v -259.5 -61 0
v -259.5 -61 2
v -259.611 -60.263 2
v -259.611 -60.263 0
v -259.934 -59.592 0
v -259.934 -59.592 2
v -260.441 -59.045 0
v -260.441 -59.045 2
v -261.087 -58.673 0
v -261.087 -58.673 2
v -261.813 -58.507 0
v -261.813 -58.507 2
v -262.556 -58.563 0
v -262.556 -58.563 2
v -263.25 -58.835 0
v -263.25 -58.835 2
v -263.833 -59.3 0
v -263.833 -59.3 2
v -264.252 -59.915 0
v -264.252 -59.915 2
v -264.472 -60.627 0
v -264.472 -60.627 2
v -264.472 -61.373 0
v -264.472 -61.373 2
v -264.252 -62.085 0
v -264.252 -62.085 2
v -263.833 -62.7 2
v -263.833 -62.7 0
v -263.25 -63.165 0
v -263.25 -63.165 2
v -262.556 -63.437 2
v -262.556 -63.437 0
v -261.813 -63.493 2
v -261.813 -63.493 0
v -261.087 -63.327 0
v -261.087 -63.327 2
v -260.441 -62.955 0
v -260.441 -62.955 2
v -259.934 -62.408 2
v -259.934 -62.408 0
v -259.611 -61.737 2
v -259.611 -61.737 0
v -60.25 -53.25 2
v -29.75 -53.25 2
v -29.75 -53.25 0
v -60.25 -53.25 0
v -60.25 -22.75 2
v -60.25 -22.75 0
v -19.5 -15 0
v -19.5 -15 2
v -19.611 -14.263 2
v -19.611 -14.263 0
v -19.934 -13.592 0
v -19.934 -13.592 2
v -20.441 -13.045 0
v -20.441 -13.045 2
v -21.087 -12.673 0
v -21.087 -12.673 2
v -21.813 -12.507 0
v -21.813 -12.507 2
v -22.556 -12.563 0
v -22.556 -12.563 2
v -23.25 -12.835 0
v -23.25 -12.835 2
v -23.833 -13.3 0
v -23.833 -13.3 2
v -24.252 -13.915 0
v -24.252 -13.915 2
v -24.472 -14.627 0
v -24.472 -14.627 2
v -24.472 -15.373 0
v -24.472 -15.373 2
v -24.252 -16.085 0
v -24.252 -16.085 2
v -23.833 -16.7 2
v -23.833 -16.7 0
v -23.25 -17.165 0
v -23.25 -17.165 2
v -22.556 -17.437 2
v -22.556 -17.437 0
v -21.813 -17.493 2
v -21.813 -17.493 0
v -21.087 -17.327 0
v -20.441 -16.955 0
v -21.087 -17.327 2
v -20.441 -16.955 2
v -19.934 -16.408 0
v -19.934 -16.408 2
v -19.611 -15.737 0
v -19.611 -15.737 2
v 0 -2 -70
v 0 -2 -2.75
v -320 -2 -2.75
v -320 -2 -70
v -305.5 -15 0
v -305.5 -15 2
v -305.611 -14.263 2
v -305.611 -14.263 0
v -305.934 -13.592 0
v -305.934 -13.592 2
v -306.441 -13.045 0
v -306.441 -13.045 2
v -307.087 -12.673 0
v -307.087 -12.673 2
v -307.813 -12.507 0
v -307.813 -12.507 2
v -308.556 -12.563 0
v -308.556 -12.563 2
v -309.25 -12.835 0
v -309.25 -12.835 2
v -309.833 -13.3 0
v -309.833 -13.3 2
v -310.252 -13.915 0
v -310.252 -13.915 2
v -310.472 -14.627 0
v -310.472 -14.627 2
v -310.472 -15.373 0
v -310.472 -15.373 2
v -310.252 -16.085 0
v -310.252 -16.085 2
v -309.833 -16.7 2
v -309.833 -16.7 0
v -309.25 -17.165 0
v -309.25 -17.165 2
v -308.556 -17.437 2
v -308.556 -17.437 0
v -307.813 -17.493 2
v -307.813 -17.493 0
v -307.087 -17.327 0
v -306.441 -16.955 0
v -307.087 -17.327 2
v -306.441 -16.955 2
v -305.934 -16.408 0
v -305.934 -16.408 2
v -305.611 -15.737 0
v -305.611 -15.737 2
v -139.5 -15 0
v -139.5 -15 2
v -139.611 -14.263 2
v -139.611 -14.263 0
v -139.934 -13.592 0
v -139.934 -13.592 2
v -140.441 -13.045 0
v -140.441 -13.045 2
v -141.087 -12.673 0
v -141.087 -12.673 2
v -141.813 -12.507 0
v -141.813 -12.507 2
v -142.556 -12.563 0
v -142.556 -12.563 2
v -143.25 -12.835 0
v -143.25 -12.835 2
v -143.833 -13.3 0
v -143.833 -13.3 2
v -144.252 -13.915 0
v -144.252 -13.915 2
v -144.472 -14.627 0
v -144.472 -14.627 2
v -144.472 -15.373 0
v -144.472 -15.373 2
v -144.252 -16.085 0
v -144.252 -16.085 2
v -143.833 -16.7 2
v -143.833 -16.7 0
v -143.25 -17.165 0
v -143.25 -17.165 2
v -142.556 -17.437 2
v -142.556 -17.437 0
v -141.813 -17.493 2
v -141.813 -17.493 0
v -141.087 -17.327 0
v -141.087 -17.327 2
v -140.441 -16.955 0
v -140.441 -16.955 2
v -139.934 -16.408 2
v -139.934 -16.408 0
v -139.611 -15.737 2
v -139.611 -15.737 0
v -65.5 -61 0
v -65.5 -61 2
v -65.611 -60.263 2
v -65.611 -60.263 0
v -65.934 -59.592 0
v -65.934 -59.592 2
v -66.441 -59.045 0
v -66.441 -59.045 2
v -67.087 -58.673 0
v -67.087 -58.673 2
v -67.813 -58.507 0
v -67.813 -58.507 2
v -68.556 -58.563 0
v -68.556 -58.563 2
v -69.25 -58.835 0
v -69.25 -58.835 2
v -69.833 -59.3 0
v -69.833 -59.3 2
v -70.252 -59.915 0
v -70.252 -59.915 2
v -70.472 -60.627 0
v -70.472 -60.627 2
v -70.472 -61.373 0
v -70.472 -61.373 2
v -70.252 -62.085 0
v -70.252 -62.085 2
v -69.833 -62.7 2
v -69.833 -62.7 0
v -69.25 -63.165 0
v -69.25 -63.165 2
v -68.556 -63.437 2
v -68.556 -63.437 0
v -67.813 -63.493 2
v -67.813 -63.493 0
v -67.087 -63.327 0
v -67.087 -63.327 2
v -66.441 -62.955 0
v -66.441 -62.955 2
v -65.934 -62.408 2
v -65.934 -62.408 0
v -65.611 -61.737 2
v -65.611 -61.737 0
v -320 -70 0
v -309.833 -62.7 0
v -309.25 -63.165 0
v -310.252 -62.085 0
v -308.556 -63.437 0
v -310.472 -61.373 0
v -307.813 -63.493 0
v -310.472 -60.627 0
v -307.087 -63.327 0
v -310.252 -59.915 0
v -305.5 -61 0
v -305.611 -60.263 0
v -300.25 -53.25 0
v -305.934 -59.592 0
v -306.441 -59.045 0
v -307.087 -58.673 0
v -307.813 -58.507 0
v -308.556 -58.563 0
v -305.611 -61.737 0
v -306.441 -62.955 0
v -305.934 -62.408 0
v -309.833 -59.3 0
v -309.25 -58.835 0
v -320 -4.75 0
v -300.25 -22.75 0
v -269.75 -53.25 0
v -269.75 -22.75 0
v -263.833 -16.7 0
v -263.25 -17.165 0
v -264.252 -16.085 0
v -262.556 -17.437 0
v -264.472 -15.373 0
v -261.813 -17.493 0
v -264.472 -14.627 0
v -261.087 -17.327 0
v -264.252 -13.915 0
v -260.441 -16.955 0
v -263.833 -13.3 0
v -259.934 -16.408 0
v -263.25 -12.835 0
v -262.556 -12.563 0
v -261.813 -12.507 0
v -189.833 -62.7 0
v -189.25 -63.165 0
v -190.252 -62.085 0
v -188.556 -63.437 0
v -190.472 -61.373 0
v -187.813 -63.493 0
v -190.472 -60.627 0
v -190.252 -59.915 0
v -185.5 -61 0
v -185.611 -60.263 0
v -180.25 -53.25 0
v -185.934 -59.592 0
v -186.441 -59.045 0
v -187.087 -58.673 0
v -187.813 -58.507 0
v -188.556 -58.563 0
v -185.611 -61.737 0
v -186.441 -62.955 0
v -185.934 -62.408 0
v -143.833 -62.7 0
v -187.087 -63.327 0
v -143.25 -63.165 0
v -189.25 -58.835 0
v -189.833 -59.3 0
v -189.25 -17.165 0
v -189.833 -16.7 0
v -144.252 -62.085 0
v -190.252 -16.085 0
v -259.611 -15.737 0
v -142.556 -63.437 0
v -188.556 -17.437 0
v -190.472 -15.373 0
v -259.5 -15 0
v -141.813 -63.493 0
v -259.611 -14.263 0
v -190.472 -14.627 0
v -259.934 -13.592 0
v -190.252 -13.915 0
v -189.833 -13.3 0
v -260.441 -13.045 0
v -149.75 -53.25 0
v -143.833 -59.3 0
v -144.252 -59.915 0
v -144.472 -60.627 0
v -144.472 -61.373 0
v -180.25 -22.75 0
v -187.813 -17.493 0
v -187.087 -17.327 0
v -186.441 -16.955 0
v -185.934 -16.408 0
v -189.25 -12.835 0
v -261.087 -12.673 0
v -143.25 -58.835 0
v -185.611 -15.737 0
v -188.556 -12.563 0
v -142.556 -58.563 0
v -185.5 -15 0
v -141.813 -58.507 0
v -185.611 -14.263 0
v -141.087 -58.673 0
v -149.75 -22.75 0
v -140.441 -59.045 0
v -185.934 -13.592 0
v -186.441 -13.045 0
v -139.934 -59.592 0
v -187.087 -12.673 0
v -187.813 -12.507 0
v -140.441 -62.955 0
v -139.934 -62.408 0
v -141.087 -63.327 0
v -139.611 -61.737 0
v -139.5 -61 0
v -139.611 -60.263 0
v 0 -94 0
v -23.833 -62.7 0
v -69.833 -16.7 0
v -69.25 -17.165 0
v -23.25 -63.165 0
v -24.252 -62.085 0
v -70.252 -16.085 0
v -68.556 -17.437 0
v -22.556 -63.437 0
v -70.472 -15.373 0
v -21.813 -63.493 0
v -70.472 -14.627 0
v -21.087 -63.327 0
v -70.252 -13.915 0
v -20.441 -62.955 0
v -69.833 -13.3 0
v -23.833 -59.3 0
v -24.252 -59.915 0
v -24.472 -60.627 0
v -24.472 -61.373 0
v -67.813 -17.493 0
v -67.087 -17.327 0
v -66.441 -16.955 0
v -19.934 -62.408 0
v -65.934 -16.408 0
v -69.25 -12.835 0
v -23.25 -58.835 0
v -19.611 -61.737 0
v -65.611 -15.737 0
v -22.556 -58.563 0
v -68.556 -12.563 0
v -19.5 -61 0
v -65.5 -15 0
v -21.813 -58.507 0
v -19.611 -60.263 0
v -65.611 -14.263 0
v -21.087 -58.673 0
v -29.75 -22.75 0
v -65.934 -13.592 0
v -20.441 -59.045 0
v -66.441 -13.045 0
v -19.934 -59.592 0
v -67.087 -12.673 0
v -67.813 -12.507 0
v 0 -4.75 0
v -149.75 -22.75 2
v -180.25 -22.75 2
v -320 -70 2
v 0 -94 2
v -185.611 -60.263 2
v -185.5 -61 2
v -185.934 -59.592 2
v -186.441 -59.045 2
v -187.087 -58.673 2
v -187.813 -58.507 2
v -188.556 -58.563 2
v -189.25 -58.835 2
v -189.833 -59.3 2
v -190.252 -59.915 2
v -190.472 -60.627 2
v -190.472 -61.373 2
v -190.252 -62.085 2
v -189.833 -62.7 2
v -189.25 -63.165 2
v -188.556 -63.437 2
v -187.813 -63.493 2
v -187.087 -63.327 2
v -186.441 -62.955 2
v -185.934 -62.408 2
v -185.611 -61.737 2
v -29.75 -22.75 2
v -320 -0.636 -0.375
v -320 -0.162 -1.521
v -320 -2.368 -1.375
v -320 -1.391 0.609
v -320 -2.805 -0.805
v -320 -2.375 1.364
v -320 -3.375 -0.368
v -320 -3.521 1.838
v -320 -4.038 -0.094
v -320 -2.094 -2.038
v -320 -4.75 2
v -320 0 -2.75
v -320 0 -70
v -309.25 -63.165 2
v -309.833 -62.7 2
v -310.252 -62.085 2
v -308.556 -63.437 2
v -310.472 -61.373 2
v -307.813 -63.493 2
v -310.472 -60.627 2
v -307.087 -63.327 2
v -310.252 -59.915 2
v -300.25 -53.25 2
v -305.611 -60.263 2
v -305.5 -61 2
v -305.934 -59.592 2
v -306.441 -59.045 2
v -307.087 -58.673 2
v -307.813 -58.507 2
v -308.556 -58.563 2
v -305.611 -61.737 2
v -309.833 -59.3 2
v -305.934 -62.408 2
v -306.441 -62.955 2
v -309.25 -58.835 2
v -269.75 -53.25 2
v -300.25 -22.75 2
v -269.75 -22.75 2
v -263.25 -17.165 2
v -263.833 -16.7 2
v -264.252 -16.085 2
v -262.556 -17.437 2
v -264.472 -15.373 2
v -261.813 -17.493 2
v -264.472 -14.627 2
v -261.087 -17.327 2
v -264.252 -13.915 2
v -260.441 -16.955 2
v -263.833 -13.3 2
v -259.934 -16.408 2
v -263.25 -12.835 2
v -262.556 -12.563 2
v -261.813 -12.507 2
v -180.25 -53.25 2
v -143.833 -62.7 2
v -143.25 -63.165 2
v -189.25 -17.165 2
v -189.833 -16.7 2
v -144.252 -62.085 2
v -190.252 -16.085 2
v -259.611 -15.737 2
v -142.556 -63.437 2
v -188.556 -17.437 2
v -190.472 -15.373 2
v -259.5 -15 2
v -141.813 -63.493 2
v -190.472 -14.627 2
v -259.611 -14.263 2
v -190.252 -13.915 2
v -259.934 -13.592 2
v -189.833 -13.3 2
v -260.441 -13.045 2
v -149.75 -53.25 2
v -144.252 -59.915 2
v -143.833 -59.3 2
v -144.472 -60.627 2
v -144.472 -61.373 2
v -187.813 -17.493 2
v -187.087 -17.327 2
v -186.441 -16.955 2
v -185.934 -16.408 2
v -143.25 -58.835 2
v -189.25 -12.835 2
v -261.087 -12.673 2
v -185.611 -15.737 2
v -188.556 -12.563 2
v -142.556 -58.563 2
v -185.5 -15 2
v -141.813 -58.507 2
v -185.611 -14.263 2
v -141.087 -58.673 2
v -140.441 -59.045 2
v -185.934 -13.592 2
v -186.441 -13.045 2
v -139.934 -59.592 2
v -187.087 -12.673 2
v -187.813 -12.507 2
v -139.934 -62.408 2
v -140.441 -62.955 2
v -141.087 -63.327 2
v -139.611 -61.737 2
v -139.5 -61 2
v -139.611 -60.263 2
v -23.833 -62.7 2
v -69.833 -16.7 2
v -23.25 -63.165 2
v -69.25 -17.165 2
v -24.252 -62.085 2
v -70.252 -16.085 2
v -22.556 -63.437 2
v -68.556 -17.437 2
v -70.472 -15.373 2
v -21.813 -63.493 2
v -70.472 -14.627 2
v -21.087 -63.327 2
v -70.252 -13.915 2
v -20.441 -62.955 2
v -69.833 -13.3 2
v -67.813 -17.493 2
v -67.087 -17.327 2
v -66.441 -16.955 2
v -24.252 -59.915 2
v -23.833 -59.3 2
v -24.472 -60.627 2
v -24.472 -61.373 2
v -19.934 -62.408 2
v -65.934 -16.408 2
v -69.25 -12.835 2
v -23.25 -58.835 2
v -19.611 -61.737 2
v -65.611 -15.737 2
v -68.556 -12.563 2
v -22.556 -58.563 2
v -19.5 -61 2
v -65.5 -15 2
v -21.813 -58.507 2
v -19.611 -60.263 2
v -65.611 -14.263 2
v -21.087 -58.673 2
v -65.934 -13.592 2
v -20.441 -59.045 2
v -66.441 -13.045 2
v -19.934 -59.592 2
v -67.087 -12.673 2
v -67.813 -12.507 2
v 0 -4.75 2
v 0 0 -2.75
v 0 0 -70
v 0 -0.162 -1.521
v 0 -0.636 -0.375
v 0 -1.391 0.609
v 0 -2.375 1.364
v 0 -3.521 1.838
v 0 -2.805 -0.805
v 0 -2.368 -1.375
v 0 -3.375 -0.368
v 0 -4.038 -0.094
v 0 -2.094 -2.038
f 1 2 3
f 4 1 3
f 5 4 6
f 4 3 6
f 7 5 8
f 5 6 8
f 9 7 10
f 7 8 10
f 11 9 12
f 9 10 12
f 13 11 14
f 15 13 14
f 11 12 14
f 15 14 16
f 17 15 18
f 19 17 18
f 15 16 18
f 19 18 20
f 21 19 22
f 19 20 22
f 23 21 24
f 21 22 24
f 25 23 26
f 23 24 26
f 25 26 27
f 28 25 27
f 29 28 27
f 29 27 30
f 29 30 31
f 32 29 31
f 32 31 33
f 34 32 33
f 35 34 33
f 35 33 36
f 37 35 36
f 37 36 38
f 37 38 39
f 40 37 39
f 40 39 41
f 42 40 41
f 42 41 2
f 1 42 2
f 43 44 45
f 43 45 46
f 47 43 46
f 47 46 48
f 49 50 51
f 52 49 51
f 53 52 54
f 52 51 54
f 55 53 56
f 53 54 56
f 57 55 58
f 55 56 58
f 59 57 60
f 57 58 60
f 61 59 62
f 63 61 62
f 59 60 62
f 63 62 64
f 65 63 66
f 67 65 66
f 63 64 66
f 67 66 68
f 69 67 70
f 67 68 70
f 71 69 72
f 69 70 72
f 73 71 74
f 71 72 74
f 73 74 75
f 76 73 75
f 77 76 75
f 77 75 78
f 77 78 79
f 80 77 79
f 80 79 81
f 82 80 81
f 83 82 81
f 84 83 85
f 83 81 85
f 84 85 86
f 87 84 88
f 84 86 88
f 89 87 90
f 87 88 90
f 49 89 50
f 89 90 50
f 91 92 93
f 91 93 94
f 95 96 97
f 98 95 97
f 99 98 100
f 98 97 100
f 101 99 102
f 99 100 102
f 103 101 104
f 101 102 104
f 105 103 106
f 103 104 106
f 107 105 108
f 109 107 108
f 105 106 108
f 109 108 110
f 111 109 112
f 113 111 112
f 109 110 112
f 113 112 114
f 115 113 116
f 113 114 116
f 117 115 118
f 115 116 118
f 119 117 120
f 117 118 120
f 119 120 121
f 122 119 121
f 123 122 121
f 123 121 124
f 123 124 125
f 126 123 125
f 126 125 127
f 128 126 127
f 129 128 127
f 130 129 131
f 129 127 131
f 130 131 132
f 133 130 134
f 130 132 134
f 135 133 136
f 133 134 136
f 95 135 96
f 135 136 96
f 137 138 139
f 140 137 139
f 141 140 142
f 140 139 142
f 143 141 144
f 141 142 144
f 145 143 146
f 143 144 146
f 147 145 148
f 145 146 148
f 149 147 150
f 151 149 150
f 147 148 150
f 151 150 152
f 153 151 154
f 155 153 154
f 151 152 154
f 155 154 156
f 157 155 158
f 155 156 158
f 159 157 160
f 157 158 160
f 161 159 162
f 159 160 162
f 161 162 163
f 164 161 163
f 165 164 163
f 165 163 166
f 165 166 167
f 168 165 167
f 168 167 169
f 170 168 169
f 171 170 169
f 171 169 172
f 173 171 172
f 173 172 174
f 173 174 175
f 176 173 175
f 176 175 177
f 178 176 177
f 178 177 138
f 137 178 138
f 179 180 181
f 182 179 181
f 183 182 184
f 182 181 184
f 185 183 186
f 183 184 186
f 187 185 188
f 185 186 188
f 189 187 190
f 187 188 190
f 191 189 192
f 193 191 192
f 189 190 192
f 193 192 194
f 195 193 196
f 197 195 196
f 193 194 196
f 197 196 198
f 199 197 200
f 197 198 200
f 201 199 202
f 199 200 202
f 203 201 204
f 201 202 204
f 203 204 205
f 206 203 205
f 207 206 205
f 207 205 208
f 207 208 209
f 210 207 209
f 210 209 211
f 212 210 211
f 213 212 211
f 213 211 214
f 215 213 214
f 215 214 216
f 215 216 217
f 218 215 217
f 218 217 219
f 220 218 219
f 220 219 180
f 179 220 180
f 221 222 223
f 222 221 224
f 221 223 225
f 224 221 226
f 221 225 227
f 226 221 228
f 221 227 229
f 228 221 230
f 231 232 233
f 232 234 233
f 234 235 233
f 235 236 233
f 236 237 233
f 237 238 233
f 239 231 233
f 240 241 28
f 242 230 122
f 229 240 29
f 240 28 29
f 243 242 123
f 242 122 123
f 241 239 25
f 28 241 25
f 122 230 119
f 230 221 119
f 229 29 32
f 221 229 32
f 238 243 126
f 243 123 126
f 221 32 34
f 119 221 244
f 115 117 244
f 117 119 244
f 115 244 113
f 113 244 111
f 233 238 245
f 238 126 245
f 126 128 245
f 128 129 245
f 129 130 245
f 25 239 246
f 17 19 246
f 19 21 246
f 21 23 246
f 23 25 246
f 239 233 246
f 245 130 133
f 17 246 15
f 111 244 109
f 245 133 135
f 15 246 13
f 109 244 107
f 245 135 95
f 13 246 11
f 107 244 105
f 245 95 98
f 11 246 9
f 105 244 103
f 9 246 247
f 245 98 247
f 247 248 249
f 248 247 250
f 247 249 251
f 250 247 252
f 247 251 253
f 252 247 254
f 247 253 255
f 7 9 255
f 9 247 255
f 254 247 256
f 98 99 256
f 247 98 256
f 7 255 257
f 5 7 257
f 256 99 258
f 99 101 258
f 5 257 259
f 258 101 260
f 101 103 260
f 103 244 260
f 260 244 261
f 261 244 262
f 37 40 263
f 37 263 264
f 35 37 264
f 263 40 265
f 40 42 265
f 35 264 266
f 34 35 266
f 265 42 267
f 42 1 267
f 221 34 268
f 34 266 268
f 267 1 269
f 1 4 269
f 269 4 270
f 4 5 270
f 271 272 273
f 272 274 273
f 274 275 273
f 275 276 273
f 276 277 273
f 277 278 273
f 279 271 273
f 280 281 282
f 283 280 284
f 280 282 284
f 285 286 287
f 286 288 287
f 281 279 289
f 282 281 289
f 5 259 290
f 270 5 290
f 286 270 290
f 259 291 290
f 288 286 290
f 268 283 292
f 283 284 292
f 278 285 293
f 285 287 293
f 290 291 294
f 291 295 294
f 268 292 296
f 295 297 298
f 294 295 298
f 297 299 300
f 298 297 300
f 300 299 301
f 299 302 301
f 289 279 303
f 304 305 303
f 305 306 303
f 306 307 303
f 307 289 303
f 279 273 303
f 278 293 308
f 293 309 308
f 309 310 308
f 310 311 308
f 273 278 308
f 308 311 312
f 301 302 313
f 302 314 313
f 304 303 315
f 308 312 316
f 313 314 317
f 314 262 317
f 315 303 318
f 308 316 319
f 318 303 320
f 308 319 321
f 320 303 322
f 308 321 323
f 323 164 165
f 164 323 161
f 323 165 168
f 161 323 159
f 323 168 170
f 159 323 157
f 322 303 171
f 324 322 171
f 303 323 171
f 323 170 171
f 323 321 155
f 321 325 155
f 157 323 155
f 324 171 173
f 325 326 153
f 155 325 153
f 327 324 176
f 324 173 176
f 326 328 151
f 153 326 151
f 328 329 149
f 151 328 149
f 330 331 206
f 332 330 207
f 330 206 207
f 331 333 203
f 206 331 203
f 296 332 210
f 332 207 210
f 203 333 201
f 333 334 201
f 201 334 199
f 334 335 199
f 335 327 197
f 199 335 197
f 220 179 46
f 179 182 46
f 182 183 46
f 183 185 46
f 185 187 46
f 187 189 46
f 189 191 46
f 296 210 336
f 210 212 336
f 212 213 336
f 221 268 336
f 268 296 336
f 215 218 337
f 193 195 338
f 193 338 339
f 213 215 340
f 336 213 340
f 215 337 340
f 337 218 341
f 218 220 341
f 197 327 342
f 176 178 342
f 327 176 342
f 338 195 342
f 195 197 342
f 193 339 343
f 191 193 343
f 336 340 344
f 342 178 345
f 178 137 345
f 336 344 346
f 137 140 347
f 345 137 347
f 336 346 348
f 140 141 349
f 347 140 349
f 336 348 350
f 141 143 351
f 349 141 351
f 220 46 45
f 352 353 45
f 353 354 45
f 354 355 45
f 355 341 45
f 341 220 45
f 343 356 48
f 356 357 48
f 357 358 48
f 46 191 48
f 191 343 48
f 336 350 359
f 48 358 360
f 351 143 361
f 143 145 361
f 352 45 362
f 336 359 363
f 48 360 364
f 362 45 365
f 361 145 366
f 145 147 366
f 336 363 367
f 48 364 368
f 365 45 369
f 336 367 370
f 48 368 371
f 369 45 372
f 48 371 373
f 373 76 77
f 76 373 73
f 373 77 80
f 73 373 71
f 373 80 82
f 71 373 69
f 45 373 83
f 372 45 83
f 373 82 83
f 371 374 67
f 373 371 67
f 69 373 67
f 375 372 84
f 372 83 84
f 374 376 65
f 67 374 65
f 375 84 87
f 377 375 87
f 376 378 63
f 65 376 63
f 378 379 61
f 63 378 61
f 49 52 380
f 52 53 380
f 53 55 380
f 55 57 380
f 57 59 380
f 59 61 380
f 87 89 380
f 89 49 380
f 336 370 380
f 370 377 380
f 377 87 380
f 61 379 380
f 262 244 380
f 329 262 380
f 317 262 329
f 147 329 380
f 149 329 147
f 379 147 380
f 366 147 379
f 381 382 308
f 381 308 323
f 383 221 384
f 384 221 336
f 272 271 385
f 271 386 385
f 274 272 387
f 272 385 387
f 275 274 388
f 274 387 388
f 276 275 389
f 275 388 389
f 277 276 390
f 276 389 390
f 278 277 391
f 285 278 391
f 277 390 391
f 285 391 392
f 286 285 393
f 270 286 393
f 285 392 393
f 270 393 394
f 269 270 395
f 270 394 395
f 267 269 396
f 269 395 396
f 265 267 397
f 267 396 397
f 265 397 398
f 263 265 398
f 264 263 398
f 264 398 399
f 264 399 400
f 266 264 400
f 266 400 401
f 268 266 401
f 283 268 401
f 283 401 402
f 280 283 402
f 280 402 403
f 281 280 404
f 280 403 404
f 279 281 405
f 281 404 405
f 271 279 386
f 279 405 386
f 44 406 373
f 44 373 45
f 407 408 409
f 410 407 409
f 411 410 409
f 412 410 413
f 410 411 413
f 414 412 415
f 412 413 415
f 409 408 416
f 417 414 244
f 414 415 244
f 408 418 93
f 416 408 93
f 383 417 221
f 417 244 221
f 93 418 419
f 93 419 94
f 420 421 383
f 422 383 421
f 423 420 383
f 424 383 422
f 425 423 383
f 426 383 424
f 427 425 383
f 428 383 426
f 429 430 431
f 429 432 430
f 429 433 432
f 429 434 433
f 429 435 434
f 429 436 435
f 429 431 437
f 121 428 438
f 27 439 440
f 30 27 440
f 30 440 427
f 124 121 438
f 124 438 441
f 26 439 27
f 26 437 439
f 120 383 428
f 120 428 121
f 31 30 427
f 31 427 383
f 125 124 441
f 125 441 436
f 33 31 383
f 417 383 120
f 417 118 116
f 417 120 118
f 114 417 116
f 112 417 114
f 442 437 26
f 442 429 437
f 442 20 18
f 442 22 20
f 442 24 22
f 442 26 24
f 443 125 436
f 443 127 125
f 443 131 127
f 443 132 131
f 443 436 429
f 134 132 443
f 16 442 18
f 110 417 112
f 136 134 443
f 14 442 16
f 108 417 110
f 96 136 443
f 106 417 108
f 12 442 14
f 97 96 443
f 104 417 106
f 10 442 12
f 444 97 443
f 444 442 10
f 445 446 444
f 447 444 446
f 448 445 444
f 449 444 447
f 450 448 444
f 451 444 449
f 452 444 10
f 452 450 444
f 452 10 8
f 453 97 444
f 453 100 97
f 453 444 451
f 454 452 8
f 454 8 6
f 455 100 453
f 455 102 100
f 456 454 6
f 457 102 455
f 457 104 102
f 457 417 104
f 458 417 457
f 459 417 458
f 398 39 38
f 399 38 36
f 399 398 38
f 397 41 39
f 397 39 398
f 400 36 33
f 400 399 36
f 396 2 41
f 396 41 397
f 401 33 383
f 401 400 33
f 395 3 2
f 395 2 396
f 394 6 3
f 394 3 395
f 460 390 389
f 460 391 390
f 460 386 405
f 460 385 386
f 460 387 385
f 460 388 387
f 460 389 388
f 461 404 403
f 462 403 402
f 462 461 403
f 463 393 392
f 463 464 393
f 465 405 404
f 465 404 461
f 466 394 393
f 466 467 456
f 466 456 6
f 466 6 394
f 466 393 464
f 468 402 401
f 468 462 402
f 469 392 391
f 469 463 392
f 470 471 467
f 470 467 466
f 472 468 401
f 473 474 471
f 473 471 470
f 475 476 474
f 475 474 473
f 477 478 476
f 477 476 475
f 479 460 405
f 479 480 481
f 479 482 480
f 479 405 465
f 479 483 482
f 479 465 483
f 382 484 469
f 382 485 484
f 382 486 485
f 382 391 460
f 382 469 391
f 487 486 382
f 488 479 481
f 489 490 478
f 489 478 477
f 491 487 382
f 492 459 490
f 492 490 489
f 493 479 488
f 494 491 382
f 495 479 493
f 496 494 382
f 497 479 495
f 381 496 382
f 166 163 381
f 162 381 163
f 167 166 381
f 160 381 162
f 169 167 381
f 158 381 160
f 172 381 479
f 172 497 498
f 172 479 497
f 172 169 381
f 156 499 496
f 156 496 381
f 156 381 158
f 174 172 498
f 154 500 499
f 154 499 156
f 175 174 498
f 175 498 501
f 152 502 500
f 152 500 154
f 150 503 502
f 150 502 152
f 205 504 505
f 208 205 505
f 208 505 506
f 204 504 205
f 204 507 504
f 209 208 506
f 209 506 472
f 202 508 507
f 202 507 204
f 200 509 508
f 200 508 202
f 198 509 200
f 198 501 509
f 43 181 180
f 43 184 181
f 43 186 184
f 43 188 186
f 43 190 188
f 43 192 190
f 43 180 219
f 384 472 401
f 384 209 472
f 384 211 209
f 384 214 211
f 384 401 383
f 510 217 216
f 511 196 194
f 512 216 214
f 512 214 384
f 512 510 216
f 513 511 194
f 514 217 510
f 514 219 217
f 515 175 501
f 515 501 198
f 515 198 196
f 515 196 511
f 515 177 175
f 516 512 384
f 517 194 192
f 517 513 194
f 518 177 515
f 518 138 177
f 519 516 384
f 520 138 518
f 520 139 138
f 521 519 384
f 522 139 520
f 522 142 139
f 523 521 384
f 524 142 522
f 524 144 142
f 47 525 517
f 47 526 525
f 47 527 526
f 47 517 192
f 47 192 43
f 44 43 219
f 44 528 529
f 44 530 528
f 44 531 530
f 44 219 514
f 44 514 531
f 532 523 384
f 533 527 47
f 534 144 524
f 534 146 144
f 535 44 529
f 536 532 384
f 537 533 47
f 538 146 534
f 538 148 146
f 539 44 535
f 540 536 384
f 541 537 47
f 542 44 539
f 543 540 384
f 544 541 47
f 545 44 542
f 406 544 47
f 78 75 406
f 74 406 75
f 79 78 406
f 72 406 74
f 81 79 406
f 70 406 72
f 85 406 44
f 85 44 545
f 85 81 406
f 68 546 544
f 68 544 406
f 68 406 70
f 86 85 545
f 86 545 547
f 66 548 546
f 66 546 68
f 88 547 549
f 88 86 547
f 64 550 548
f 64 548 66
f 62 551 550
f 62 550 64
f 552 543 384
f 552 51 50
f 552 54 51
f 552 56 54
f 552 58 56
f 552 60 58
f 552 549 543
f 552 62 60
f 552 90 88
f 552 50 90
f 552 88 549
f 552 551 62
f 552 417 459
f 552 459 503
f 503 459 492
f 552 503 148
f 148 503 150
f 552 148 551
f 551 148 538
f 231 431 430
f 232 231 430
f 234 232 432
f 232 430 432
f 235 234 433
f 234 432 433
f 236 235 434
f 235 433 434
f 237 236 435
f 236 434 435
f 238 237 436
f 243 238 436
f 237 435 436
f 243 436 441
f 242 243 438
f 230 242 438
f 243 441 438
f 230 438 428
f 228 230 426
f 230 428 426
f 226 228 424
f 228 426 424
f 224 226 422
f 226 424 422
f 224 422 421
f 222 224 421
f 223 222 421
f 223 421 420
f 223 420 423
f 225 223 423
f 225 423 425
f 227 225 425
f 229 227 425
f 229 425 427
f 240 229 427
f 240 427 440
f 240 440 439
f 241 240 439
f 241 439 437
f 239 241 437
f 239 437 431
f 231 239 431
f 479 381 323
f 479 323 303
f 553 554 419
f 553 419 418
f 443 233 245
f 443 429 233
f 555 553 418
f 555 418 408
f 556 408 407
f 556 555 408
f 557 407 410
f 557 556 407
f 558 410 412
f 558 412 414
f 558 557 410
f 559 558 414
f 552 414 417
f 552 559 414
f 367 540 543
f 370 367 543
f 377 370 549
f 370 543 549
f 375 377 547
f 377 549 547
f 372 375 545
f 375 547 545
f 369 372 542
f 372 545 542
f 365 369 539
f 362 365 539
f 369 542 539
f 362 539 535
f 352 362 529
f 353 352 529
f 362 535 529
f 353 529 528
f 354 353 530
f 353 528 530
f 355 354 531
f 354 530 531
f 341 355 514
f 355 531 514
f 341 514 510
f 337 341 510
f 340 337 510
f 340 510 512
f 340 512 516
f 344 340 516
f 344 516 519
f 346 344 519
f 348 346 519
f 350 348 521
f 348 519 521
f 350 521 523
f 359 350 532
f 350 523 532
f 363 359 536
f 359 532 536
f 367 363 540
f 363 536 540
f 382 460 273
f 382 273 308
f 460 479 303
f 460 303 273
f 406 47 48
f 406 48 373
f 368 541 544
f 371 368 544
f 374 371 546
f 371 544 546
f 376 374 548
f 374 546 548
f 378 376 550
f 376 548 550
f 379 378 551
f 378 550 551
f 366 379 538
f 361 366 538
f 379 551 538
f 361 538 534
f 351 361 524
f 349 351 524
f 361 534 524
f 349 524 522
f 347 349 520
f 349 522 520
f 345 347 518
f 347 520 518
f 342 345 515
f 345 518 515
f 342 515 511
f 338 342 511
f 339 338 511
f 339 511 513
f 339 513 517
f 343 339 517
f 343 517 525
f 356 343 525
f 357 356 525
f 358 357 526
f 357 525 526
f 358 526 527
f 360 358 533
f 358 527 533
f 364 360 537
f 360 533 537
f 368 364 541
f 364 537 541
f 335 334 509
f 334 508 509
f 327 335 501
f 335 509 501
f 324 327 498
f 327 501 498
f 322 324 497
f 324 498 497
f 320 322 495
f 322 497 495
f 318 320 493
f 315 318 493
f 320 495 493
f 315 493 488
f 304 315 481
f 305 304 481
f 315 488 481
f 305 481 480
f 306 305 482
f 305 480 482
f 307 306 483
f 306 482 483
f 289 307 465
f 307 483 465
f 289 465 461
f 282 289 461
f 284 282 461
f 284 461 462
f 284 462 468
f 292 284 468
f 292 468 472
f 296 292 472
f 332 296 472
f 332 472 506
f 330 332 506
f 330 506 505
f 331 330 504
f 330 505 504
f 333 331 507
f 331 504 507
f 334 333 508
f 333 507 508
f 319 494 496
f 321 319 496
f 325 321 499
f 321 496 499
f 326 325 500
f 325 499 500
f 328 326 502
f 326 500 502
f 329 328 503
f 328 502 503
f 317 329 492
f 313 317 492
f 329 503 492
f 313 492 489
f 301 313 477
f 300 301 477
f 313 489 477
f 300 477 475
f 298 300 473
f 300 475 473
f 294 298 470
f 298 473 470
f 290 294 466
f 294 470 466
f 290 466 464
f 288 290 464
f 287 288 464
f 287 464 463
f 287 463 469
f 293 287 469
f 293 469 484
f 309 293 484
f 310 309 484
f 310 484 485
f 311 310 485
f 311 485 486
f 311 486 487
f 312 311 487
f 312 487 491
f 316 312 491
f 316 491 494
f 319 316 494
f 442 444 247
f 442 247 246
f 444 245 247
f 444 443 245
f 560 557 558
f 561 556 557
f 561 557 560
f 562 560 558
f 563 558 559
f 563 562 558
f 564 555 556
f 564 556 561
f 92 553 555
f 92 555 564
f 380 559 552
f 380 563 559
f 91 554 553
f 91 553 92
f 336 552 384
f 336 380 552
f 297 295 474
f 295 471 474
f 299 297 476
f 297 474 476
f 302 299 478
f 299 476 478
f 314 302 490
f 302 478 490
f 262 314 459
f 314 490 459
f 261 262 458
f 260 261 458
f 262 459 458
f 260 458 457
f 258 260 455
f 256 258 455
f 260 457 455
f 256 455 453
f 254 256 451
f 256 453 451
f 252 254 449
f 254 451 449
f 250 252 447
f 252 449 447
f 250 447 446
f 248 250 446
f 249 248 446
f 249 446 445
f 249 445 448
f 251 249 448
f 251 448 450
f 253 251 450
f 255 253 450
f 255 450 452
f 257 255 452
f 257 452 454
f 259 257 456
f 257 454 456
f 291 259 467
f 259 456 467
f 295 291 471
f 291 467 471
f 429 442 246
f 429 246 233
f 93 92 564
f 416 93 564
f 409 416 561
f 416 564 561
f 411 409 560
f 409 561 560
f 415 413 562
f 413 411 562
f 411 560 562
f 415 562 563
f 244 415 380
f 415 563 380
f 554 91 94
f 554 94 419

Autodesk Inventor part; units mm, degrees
ref_plane "YZ Plane" through (0, 0, 0) normal (1, 0, 0) x (0, 1, 0)
ref_plane "XZ Plane" through (0, 0, 0) normal (0, 1, 0) x (-1, 0, 0)
ref_plane "XY Plane" through (0, 0, 0) normal (0, 0, 1) x (1, 0, 0)
sketch "Sketch1" plane through (0, 0, 0) normal (0, 0, 1) x (1, 0, 0)
  line L0 (0, 0) -> (-320, 0)
  line L1 (0, -94) -> (0, 0)
  line L2 (-320, 0) -> (-320, -70)
  line L3 (-320, -70) -> (0, -94)
  point P0 (0, -47)
  dimension "d32" = 94
  dimension "d60" = 70
  dimension "d61" = 320
extrude "Plate1" add sketch "Sketch1" along normal blind 2
sketch "Sketch8" plane through (0, 0, 2) normal (0, 0, 1) x (1, 0, 0)
  line L0 (-29.75, -53.25) -> (-60.25, -53.25)
  line L1 (-60.25, -53.25) -> (-60.25, -22.75)
  line L2 (-60.25, -22.75) -> (-29.75, -22.75)
  line L3 (-29.75, -22.75) -> (-29.75, -53.25)
  line L4 (-29.75, -53.25) -> (-60.25, -22.75) construction
  line L5 (-60.25, -53.25) -> (-29.75, -22.75) construction
  circle A0 centre (-22, -61) radius 2.5
  circle A1 centre (-68, -61) radius 2.5
  circle A2 centre (-68, -15) radius 2.5
  circle A3 centre (-22, -15) radius 2.5
  line L6 (0, 0) -> (0, -94) projected
  line L7 (-320, 0) -> (0, 0) projected
  line L8 (-60.25, -53.25) -> (-68, -61) construction
  line L9 (-68, -15) -> (-22, -15) construction
  line L10 (-22, -15) -> (-22, -61) construction
  line L11 (-22, -61) -> (-68, -61) construction
  line L12 (-68, -61) -> (-68, -15) construction
  point P0 (-45, -38)
  dimension "d51" = 30.5
  dimension "d52" = 30.5
  dimension "d53" = 5
  dimension "d72" = 45
  dimension "d78" = 46
  dimension "d79" = 15
extrude "Cut3" cut sketch "Sketch8" against normal blind 2
pattern_linear "Rectangular Pattern1" count 3 spacing 120 along (-1, 0, 0) of "Cut3"
sketch "Sketch9" plane through (0, -2, 2) normal (0, 1, 0) x (-1, 0, 0)
  line L0 (320, 0) -> (0, 0)
  line L1 (0, 0) -> (0, -72)
  line L2 (0, -72) -> (320, -72)
  line L3 (320, -72) -> (320, 0)
edge flange "Flange3" height 72 angle 90 thickness 2 bend radius 2.75 thickness toward (0, 1, 0) relief round relief width 2 relief depth 1 edges at (-160, 0, 0) wall of the first edge with corners at (-320, -2, 2) (0, -2, 2) (0, -2, -70) (-320, -2, -70)
bend "Bend3"
corner "Corner3"
equation "\"d51\" = d52"
equation "\"d55\" = Thickness"
equation "\"d2\" = Thickness"
equation "\"d62\" = BendReliefWidth"
equation "\"d63\" = BendReliefDepth"
equation "\"d64\" = MinimumRemnant"
equation "\"d65\" = TransitionRadius"
equation "\"d68\" = BendRadius"
equation "\"d69\" = CornerReliefSize"
equation "\"d70\" = GapSize"
equation "\"d71\" = JacobiRadiusSize"
equation "\"BendReliefWidth\" = Thickness"
equation "\"BendReliefDepth\" = 0.5 * Thickness"
equation "\"CornerReliefSize\" = 4 * Thickness"
equation "\"MinimumRemnant\" = 2 * Thickness"
equation "\"TransitionRadius\" = BendRadius"
equation "\"JacobiRadiusSize\" = BendRadius"
equation "\"GapSize\" = Thickness"
equation "\"Thickness\" = 2"
equation "\"BendRadius\" = 2.75"
properties part number "PRS 8422 BOTTOM FDS diameter way up_940" material "Stainless Steel"
